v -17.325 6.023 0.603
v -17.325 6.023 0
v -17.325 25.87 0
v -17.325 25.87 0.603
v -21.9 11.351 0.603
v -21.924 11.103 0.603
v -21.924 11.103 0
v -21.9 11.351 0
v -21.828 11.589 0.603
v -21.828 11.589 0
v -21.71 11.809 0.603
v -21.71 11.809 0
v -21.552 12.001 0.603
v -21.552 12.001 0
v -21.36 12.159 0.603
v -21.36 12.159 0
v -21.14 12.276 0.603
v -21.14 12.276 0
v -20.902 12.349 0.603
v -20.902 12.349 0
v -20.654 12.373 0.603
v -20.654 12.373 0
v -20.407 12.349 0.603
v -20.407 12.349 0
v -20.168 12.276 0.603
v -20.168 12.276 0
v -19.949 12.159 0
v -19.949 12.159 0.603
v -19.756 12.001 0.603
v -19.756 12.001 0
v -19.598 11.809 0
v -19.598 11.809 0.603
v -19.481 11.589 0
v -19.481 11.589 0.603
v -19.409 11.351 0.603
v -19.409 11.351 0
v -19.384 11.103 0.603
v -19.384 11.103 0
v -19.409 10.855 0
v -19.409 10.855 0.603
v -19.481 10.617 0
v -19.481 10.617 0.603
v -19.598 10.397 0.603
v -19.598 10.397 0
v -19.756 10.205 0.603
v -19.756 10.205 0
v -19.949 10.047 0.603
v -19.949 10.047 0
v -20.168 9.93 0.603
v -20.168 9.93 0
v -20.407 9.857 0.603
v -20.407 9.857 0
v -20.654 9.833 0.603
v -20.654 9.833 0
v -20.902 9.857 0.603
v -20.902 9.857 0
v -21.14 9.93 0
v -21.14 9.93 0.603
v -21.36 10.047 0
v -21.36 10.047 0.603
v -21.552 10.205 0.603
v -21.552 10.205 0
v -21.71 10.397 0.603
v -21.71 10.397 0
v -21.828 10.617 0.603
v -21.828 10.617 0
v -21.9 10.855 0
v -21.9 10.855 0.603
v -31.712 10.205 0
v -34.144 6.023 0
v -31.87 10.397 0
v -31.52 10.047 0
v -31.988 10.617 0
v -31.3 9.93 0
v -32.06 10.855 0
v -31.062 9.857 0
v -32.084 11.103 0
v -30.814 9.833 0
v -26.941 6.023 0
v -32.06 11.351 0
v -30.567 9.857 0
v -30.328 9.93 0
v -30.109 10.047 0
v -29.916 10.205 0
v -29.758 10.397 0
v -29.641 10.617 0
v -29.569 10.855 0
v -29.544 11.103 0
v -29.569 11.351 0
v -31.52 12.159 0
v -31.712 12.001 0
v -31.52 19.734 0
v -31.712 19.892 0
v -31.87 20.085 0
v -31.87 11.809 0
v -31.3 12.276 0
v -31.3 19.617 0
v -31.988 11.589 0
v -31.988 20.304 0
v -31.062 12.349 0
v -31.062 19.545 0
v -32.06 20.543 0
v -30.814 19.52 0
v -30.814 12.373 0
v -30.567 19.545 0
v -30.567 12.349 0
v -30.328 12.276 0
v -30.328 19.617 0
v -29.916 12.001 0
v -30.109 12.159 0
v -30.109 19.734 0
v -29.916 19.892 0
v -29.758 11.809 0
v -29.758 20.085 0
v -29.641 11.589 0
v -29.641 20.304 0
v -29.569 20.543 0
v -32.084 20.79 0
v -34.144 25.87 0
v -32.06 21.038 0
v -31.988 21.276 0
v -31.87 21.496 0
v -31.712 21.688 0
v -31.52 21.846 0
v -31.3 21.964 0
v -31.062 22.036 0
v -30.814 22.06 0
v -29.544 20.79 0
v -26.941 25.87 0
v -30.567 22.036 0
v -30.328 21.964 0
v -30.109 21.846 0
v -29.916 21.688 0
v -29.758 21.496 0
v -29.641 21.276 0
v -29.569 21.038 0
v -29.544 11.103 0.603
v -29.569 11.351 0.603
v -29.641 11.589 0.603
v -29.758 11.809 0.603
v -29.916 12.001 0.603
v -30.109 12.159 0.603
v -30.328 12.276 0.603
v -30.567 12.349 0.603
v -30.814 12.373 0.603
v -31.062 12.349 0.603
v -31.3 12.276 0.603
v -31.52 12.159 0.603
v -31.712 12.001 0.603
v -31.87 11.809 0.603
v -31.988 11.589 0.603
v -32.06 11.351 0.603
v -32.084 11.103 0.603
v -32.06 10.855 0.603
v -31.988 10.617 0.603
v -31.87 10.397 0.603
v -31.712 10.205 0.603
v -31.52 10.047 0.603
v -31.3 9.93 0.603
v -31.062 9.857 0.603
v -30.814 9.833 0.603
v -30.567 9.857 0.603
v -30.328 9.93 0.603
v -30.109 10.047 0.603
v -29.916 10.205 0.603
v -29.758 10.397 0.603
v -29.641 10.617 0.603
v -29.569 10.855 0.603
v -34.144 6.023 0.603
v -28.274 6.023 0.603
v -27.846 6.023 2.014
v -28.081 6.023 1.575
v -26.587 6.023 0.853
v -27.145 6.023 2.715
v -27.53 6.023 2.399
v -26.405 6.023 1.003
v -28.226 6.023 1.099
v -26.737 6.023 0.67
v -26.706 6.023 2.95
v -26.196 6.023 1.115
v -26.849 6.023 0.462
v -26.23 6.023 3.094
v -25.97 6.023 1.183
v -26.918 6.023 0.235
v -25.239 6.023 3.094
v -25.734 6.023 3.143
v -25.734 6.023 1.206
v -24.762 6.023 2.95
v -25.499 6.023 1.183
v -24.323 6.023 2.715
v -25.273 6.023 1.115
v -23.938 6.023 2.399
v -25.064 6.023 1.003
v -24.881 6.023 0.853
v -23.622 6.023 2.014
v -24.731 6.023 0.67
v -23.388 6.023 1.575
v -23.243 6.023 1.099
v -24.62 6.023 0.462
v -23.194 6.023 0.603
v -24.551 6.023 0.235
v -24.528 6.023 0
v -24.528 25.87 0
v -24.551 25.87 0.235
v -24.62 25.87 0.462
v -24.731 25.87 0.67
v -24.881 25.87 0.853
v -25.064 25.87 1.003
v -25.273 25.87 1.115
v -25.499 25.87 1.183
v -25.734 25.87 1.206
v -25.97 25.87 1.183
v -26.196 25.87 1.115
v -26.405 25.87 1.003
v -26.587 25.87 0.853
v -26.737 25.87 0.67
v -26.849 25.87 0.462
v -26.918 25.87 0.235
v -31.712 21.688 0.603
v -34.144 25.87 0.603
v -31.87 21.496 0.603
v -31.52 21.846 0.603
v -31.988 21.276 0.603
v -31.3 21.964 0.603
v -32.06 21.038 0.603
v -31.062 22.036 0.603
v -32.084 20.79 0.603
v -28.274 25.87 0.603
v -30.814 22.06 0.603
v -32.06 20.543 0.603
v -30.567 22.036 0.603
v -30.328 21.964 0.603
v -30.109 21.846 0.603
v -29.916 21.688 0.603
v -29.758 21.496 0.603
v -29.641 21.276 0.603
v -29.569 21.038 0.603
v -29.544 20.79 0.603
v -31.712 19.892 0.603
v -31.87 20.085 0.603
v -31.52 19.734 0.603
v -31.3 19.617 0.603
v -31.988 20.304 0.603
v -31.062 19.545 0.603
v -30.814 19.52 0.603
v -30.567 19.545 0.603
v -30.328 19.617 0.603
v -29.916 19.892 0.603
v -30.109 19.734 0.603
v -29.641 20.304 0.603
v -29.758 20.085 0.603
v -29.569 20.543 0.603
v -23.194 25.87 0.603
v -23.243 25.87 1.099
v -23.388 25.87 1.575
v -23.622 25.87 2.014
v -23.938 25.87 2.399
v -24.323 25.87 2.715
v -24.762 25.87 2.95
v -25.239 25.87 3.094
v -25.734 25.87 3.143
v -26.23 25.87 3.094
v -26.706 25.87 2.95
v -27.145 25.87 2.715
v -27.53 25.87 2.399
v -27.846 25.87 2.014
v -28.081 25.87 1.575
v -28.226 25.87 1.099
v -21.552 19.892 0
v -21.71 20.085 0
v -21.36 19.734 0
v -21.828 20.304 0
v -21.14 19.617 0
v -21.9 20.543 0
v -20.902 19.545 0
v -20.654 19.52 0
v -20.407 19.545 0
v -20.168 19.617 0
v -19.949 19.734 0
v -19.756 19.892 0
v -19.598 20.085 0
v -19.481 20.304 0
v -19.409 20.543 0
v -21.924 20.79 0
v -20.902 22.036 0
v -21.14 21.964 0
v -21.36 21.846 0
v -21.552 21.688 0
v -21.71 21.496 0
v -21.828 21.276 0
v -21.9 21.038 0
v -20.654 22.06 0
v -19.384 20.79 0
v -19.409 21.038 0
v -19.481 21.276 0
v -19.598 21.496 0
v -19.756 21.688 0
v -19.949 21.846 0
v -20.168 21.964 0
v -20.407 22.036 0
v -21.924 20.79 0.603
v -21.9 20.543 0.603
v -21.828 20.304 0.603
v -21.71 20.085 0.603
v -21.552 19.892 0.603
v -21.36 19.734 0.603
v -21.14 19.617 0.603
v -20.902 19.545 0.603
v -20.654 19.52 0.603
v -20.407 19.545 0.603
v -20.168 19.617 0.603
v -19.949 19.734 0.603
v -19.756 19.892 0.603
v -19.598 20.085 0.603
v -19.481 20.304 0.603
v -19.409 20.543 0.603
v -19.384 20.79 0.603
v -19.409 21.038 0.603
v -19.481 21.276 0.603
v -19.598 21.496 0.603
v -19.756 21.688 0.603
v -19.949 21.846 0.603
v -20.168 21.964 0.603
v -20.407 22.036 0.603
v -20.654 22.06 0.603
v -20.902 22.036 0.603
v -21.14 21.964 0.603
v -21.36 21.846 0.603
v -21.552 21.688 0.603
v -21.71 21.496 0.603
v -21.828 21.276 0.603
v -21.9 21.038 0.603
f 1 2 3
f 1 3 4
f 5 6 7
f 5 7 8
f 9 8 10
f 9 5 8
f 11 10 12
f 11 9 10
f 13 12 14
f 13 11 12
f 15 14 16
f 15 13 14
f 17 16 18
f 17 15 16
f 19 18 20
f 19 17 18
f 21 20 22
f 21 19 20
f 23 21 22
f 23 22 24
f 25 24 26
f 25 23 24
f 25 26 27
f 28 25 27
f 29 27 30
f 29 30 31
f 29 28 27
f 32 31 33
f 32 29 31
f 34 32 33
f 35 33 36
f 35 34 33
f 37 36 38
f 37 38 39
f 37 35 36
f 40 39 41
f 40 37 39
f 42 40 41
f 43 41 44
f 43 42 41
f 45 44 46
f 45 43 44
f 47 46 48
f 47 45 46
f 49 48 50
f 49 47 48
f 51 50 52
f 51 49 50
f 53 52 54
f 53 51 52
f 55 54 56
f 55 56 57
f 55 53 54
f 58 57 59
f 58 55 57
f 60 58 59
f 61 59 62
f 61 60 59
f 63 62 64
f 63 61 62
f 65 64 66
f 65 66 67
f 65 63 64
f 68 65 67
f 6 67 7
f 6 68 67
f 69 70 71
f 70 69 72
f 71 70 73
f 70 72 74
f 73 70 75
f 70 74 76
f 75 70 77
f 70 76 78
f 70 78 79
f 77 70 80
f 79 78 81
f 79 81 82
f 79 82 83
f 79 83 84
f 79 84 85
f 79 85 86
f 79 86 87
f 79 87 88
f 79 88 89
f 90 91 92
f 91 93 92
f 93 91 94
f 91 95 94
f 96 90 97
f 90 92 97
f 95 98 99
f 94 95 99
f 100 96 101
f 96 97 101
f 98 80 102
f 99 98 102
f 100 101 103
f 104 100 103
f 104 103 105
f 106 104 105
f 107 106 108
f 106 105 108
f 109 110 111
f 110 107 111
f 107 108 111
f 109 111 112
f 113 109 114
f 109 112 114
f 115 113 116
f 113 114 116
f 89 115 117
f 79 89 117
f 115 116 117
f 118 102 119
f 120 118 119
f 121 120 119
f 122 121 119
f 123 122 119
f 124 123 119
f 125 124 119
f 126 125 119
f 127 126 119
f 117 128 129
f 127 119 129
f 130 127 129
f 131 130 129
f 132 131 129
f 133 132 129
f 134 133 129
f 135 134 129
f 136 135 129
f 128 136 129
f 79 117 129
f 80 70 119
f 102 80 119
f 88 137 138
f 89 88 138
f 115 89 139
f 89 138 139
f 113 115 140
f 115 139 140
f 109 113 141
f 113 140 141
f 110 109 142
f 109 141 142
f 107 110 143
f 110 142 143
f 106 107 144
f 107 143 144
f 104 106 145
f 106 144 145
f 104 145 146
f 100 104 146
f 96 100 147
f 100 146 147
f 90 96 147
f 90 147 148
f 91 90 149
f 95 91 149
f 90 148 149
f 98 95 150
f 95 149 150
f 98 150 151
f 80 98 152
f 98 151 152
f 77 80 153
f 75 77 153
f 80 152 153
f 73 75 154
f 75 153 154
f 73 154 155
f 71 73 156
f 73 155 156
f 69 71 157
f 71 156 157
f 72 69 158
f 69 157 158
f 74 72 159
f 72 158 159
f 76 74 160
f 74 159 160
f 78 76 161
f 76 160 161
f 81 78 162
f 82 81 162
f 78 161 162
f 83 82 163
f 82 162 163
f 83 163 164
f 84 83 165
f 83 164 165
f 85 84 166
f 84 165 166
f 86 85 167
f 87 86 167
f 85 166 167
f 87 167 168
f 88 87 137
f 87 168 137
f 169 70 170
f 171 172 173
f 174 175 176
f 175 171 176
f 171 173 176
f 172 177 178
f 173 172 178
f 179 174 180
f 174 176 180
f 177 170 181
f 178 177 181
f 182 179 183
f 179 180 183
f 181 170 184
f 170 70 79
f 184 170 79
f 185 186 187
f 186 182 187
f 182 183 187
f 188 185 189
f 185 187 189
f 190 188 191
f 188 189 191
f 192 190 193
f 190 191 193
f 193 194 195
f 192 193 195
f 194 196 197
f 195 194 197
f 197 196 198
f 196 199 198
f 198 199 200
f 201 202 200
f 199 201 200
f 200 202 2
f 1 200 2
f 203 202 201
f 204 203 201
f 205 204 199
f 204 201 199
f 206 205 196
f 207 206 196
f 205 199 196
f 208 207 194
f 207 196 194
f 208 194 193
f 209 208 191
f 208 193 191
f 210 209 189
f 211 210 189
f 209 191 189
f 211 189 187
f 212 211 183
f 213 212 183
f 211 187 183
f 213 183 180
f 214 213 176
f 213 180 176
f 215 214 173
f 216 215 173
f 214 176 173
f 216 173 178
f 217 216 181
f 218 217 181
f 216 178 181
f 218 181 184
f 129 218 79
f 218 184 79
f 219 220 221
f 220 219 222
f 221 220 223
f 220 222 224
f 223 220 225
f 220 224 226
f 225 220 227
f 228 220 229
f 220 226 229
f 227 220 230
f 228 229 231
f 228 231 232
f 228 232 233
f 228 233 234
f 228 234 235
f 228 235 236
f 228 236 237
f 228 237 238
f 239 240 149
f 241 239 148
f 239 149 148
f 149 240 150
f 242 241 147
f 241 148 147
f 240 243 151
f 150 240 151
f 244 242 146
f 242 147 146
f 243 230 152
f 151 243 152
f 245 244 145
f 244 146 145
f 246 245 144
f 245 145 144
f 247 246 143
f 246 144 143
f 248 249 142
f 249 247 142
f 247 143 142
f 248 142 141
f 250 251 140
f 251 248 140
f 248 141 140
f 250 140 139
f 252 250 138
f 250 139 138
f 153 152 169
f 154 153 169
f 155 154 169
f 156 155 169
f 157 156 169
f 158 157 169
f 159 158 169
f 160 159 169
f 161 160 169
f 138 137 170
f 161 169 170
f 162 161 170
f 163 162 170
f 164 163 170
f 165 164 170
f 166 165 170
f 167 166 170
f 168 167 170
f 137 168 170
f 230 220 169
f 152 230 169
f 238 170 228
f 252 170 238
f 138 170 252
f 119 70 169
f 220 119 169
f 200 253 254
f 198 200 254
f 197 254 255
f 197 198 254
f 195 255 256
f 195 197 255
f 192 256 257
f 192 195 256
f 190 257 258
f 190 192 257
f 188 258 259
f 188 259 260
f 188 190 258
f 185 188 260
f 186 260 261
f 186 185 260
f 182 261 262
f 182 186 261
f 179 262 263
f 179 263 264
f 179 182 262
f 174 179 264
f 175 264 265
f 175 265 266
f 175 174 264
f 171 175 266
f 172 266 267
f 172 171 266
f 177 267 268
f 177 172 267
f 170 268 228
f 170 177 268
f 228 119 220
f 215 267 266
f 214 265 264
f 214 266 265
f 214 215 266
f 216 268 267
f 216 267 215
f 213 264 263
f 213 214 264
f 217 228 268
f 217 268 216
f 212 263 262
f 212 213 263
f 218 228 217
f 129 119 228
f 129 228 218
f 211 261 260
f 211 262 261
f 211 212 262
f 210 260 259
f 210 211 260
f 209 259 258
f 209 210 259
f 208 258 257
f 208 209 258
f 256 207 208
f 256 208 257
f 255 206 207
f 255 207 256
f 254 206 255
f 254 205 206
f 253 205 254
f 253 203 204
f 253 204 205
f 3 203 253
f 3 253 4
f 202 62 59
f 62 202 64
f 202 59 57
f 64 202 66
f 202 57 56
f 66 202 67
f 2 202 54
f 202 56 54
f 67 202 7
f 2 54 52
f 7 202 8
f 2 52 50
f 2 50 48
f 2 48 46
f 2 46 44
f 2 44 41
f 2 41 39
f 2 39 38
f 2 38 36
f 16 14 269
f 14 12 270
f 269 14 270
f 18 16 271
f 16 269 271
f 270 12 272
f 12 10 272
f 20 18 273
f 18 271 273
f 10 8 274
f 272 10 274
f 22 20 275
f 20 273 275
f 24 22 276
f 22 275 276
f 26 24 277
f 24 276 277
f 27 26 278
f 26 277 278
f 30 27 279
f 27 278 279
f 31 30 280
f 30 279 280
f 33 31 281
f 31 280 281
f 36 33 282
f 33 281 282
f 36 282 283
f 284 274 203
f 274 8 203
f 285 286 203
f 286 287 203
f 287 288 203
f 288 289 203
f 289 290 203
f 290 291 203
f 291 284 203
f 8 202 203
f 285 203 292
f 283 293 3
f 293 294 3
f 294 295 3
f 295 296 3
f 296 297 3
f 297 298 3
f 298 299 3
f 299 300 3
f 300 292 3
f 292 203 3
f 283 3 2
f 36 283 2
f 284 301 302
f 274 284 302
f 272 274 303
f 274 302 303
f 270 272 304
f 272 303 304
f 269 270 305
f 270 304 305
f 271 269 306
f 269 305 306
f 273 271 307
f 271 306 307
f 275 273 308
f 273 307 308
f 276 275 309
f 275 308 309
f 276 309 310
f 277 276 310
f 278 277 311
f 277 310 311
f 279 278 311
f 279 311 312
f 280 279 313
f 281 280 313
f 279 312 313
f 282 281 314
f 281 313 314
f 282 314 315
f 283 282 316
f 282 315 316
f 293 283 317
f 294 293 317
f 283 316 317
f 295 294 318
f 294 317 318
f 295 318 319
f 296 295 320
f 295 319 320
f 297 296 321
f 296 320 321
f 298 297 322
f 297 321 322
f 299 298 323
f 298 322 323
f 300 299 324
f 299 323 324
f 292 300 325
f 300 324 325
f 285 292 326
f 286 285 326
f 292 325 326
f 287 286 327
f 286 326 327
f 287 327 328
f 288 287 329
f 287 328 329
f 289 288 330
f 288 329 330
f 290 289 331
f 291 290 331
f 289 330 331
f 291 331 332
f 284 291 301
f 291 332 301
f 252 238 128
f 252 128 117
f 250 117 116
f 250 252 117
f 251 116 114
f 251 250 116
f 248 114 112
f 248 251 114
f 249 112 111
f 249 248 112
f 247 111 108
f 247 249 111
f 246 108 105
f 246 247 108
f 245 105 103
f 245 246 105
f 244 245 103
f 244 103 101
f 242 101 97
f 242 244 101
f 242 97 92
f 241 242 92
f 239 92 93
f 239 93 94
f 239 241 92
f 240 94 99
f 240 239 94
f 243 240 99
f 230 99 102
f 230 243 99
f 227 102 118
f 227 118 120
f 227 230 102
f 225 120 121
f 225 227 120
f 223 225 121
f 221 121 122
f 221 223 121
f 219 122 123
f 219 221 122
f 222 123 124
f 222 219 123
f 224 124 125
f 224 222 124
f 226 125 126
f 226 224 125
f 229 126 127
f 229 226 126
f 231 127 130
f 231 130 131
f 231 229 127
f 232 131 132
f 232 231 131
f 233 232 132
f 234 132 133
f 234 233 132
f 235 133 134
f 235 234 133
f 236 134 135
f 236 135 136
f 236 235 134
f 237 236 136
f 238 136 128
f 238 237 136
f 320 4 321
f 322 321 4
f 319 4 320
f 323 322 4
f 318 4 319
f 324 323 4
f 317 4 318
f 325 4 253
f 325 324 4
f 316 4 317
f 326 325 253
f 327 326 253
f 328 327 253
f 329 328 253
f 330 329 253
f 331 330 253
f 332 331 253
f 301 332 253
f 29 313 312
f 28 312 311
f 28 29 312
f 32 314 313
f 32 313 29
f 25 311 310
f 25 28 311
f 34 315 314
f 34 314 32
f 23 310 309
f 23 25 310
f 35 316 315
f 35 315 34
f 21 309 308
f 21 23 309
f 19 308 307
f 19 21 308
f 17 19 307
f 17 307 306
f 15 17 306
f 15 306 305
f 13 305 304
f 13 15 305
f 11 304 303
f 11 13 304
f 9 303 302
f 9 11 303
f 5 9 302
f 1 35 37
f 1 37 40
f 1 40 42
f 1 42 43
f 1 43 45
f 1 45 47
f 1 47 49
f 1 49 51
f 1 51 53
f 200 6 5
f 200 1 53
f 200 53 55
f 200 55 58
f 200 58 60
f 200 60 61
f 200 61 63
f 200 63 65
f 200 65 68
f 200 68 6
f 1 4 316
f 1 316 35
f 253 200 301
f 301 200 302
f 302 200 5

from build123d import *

# Parameters (mm, degrees)
SKETCH1_W               = 31.224798093
SKETCH1_H               = 19.847341298
BOSS_EXTRUDE1_DEPTH     = 3.302
SKETCH2_R               = 1.2065
CUT_EXTRUDE1_DEPTH      = 19.847341298
SKETCH3_W               = 6.232143457
SKETCH3_H               = 2.69875
CUT_EXTRUDE2_DEPTH      = 19.847341298
CUT_EXTRUDE4_DEPTH      = 19.847341298
SKETCH6_W               = 7.202949523
SKETCH6_H               = 3.302
CUT_EXTRUDE5_DEPTH      = 19.847341298
SKETCH7_R               = 1.27
CUT_EXTRUDE6_DEPTH      = 0.60325
MIRROR4_COPY_1_SKETCH_R = 1.27
MIRROR4_COPY_1_DEPTH    = 0.60325


with BuildPart() as part:
    # Sketch1 → Boss-Extrude1 (new body)
    with BuildSketch(Plane.XY):
        with Locations((-25.734325238, 15.946701424)):
            Rectangle(SKETCH1_W, SKETCH1_H)
    extrude(amount=BOSS_EXTRUDE1_DEPTH)

    # Sketch2 → Cut-Extrude1 (cut)
    with BuildSketch(Plane.XZ.offset(-6.023030775)):
        with Locations((-25.734325238, 0)):
            Circle(SKETCH2_R)
    extrude(amount=-CUT_EXTRUDE1_DEPTH, mode=Mode.SUBTRACT)

    # Sketch3 → Cut-Extrude2 (cut)
    with BuildSketch(Plane.XZ.offset(-6.023030775)):
        with Locations((-31.390396967, 1.952625)):
            Rectangle(SKETCH3_W, SKETCH3_H)
    cut_extrude2 = extrude(amount=-CUT_EXTRUDE2_DEPTH, mode=Mode.SUBTRACT)

    # Mirror1: Cut-Extrude2 across plane
    add(cut_extrude2.mirror(Plane.ZY.offset(25.734325238)), mode=Mode.SUBTRACT)

    # Sketch5 → Cut-Extrude4 (cut)
    with BuildSketch(Plane.XZ.offset(-6.023030775)):
        with BuildLine():
            Line((-28.274325238, 0.60325), (-28.274325238, 3.302))
            Line((-28.274325238, 3.302), (-23.194325238, 3.302))
            Line((-23.194325238, 3.302), (-23.194325238, 0.60325))
            ThreePointArc((-23.194325238, 0.60325), (-25.734325238, 3.14325), (-28.274325238, 0.60325))
        make_face()
    extrude(amount=-CUT_EXTRUDE4_DEPTH, mode=Mode.SUBTRACT)

    # Sketch6 → Cut-Extrude5 (cut)
    with BuildSketch(Plane.XZ.offset(-6.023030775)):
        with Locations((-37.745249523, 1.651)):
            Rectangle(SKETCH6_W, SKETCH6_H)
    cut_extrude5 = extrude(amount=-CUT_EXTRUDE5_DEPTH, mode=Mode.SUBTRACT)

    # Mirror2: Cut-Extrude5 across plane
    add(cut_extrude5.mirror(Plane.ZY.offset(25.734325238)), mode=Mode.SUBTRACT)

    # Sketch7 → Cut-Extrude6 (cut)
    with BuildSketch(Plane.XY.offset(0.60325)):
        with Locations((-30.814325238, 11.103030775)):
            Circle(SKETCH7_R)
    cut_extrude6 = extrude(amount=-CUT_EXTRUDE6_DEPTH, mode=Mode.SUBTRACT)

    # Mirror3: Cut-Extrude6 across plane
    add(cut_extrude6.mirror(Plane(origin=(0, 15.946701424, 0), x_dir=(0, 0, 1), z_dir=(0, -1, 0))), mode=Mode.SUBTRACT)

    # Mirror4: Cut-Extrude6 across plane
    add(cut_extrude6.mirror(Plane.ZY.offset(25.734325238)), mode=Mode.SUBTRACT)

    # Mirror4 copy 1 sketch → Mirror4 copy 1 (cut)
    with BuildSketch(Plane(origin=(-51.468650475, 31.893402848, 0.60325), x_dir=(-1, 0, 0), z_dir=(0, 0, 1))):
        with Locations((-30.814325238, 11.103030775)):
            Circle(MIRROR4_COPY_1_SKETCH_R)
    extrude(amount=-MIRROR4_COPY_1_DEPTH, mode=Mode.SUBTRACT)


solid = part.part
